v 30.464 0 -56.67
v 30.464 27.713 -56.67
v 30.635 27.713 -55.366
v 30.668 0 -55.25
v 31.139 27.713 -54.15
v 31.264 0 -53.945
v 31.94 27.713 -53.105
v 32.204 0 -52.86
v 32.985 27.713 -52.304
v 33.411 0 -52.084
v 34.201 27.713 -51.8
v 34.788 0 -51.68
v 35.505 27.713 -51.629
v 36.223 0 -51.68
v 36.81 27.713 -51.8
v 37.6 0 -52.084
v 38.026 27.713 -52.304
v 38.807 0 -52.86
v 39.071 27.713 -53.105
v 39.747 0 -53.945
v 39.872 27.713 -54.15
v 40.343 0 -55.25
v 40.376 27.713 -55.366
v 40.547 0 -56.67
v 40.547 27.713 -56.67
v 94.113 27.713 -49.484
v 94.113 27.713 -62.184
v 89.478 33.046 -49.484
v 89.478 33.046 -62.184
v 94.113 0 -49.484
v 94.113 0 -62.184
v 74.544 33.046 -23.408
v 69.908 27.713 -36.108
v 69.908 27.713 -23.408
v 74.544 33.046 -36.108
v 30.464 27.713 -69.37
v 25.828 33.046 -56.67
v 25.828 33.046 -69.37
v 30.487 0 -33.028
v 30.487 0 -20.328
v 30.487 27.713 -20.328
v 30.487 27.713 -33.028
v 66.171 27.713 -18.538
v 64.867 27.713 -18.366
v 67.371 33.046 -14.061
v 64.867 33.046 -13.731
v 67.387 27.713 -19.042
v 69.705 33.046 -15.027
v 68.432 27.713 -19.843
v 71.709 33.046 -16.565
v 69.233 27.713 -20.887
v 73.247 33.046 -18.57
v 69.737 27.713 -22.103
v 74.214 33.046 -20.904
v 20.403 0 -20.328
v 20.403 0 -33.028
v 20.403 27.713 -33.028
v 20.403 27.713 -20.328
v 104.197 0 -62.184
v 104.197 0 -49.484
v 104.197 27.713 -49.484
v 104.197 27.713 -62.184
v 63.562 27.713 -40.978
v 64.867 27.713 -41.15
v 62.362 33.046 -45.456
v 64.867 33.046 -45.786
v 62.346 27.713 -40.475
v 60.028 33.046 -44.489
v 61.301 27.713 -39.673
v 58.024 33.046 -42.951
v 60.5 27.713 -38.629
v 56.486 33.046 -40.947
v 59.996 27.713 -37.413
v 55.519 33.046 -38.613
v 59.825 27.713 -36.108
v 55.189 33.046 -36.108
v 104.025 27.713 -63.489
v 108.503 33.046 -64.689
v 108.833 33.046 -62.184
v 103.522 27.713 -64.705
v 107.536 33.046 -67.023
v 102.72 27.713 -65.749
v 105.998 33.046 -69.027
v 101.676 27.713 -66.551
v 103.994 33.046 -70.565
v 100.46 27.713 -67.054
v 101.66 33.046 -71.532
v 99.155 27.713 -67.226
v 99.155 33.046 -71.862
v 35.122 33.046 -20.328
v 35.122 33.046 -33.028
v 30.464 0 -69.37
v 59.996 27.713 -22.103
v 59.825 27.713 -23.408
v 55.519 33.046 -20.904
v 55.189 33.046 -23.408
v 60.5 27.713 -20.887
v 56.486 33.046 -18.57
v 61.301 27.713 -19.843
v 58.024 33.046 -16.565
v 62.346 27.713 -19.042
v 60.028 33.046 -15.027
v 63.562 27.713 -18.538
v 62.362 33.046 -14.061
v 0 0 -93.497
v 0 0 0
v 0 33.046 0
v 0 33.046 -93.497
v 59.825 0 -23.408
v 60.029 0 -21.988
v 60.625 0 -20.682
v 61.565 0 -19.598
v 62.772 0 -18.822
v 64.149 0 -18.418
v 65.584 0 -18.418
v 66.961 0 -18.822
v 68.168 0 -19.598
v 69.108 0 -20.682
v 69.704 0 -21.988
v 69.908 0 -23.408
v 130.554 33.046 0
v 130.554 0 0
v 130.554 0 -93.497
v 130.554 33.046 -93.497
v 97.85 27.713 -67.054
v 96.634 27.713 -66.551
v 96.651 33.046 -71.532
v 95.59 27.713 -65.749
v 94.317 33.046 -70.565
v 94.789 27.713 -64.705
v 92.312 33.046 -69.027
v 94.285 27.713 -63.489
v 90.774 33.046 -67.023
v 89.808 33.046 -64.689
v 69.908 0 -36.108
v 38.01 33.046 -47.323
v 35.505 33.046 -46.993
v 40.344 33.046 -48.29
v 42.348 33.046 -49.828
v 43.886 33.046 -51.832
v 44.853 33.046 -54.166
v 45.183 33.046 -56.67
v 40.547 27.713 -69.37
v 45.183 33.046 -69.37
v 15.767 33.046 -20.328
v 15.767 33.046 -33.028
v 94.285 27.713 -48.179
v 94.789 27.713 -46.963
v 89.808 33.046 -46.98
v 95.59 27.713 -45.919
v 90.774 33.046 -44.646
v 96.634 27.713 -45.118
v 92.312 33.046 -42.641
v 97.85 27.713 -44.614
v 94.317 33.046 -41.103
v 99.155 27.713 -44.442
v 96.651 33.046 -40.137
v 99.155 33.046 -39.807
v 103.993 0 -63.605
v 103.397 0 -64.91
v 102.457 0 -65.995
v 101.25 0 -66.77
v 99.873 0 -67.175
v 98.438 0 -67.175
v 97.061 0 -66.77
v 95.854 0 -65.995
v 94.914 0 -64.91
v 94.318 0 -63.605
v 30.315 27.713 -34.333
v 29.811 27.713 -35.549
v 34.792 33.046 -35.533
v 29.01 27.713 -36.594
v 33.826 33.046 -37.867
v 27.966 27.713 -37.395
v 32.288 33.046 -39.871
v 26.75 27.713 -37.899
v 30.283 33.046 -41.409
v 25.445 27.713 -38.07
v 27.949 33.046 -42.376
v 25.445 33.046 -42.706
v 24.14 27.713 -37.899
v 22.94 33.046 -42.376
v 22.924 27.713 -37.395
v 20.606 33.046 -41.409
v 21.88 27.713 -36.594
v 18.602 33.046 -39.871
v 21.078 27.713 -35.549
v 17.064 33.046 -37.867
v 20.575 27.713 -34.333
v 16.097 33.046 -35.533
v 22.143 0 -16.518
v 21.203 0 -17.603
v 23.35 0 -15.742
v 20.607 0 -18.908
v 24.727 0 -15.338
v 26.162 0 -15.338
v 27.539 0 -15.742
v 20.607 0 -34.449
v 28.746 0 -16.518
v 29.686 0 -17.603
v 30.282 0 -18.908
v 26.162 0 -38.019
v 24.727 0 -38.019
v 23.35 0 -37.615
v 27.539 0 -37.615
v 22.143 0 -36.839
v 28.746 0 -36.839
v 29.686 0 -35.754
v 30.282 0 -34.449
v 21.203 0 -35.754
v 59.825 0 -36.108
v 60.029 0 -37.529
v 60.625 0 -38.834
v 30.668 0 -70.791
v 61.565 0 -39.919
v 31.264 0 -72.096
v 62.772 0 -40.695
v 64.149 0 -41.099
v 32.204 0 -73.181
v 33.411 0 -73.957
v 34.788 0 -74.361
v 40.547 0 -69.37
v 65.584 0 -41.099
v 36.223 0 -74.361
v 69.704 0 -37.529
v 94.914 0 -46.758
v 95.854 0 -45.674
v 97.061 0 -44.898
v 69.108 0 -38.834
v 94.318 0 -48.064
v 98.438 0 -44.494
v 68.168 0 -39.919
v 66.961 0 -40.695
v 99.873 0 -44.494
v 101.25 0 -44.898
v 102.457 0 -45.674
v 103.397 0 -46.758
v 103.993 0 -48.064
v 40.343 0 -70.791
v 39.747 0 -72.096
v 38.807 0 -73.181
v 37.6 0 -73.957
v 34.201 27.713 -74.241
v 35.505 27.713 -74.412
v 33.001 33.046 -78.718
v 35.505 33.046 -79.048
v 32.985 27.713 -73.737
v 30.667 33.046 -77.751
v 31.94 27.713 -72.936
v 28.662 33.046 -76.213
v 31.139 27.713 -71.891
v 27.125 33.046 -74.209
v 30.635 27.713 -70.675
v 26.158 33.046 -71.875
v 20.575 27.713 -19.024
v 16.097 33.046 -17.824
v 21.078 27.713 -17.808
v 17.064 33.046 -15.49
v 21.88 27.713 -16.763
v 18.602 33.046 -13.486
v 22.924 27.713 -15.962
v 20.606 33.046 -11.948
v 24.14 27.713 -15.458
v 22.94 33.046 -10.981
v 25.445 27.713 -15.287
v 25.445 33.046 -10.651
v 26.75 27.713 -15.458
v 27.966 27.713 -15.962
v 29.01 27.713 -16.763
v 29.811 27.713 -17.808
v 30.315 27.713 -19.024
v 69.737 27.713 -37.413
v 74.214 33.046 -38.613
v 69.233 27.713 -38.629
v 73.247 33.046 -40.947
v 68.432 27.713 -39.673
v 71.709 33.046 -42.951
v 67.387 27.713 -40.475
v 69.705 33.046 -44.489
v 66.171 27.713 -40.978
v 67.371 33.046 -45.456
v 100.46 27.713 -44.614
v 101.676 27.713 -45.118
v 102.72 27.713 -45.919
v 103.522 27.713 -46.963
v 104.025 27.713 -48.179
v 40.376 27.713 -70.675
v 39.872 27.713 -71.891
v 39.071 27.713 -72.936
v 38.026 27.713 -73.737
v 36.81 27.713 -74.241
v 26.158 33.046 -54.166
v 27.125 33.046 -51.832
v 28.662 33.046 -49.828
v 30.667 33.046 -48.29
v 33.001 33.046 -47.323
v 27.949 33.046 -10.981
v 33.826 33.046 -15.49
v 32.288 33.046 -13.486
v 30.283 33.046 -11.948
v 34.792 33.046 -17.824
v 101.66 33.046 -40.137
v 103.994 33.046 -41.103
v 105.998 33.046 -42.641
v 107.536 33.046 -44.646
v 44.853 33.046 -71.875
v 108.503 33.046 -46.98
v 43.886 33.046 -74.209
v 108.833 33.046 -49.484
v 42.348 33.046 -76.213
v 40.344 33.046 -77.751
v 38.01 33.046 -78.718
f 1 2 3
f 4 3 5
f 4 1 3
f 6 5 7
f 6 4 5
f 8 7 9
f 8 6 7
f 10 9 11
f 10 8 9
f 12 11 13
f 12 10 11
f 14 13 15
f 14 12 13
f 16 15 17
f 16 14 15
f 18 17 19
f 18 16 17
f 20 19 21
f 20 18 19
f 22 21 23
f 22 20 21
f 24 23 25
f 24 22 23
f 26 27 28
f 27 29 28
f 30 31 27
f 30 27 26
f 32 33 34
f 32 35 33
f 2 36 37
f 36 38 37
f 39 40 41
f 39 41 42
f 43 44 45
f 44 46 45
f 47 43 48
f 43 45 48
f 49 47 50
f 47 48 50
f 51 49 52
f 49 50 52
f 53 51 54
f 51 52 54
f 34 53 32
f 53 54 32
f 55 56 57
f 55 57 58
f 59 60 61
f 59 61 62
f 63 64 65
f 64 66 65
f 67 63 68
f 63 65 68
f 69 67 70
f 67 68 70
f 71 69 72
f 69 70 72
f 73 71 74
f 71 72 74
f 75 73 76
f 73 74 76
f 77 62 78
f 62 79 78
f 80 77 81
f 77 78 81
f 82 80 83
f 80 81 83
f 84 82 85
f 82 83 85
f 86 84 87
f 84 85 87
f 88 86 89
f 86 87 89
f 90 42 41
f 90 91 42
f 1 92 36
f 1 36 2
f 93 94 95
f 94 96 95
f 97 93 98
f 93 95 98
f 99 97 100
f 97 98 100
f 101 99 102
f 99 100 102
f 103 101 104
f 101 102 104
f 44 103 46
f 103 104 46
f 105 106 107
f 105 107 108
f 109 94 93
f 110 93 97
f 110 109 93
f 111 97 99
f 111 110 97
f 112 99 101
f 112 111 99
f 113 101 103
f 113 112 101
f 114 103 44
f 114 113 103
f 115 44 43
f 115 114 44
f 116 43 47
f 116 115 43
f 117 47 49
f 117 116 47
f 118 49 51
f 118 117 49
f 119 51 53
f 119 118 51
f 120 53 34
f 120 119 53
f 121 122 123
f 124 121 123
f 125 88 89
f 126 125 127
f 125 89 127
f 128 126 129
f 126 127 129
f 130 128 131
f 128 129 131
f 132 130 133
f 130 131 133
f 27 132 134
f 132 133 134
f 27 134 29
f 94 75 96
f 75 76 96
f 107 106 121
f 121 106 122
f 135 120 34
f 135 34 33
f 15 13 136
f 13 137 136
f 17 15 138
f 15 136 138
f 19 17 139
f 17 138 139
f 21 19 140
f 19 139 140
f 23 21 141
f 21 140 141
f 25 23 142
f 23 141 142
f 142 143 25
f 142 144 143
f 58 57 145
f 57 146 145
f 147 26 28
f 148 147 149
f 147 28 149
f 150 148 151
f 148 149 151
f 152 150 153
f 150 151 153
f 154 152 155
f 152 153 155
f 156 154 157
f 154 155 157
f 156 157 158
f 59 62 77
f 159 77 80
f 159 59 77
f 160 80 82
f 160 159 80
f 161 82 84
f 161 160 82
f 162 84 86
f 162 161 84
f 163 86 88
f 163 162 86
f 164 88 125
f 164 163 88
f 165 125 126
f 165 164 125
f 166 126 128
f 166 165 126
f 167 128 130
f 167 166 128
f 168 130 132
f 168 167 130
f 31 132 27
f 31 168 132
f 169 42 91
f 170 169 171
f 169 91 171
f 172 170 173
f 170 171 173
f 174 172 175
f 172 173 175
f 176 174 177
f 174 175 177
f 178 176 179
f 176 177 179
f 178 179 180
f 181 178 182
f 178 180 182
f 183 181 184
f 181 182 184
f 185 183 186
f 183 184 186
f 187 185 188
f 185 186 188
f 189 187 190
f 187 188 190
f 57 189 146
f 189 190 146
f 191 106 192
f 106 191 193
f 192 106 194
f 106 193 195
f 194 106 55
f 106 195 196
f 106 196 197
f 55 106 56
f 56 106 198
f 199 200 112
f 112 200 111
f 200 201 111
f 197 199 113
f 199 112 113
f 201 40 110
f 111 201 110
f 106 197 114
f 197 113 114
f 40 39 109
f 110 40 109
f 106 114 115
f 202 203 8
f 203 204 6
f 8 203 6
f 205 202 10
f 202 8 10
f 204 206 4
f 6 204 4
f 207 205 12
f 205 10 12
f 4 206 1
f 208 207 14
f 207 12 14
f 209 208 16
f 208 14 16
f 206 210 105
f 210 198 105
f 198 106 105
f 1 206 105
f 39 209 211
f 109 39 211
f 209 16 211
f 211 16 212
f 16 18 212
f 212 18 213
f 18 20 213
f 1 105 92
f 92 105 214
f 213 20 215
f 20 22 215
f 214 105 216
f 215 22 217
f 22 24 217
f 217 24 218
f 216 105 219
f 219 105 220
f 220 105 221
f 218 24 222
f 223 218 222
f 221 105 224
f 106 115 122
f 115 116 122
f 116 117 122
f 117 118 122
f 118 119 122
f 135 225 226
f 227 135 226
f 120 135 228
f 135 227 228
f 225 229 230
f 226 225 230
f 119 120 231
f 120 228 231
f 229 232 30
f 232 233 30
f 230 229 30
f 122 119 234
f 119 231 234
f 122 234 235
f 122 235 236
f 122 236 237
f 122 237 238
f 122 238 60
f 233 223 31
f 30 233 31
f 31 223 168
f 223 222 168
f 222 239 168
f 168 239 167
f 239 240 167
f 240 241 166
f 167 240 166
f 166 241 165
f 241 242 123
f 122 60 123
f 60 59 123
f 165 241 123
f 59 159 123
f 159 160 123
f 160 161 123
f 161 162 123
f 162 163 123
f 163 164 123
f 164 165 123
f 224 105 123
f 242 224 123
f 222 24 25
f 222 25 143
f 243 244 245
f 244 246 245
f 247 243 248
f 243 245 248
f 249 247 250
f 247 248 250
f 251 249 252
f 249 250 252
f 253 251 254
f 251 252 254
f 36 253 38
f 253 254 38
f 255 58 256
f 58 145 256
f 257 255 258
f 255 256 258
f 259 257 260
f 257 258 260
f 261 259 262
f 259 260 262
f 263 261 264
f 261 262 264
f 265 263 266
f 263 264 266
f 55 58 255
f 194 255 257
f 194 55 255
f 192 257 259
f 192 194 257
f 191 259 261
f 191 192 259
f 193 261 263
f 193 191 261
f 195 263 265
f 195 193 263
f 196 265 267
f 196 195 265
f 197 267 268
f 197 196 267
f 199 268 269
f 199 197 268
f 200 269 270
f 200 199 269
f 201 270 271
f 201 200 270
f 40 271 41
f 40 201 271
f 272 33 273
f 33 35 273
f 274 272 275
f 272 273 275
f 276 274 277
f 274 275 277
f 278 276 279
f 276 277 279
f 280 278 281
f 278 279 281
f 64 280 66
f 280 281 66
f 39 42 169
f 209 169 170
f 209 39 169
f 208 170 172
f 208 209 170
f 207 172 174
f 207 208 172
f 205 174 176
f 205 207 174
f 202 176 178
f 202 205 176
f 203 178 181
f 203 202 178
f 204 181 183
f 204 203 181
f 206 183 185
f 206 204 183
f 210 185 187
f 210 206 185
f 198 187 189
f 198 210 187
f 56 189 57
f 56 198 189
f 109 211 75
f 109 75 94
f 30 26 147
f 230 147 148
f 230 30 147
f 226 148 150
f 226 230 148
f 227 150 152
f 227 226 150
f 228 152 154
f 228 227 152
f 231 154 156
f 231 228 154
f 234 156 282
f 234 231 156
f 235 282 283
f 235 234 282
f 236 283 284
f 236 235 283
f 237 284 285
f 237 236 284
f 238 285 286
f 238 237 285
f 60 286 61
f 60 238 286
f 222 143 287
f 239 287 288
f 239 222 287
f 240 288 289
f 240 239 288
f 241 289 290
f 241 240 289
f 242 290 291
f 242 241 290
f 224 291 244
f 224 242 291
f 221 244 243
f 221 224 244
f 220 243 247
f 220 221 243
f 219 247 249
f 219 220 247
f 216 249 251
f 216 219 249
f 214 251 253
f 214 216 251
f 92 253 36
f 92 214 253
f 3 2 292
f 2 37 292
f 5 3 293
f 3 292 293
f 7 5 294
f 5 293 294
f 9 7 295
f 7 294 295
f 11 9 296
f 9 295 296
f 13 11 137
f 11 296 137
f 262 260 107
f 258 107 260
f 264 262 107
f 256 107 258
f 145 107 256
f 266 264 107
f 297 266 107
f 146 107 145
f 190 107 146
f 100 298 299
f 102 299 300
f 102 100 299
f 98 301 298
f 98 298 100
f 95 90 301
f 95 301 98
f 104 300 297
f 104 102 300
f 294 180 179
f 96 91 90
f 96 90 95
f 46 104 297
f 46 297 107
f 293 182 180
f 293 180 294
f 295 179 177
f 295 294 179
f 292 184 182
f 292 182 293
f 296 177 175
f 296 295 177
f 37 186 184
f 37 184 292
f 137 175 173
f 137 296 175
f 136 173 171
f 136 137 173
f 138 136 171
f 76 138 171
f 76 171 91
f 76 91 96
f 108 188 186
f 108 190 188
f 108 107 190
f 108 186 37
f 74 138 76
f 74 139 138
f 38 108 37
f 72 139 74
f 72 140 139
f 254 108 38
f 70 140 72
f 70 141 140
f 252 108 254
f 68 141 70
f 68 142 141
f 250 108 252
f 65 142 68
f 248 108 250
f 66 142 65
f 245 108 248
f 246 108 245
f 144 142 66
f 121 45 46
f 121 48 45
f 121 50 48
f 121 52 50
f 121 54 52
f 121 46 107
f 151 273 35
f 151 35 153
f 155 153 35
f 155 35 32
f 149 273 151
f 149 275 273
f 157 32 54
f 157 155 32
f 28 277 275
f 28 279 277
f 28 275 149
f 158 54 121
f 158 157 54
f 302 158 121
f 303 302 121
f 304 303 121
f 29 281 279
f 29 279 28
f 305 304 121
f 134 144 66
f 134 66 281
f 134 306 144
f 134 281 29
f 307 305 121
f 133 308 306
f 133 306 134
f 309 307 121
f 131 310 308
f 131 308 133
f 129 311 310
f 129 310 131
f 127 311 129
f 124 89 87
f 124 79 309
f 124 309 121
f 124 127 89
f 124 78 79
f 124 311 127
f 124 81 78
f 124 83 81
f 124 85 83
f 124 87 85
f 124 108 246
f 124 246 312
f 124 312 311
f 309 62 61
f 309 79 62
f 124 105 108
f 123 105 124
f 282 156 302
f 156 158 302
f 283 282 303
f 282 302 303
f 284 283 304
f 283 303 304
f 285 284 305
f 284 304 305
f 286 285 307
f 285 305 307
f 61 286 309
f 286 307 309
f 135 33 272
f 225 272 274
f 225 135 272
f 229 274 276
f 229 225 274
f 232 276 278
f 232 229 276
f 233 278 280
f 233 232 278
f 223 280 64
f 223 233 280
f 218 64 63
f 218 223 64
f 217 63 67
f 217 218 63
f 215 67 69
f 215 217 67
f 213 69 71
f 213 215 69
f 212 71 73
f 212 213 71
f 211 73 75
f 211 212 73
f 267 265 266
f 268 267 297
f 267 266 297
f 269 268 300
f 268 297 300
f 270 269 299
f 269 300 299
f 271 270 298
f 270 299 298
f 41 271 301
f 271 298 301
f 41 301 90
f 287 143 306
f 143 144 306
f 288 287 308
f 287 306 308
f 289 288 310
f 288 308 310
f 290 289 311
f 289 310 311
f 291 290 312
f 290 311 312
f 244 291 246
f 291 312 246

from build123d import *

# Parameters (mm, degrees)
SKETCH1_W                                      = 130.554298298
SKETCH1_H                                      = 93.497401401
BOSS_EXTRUDE1_DEPTH                            = 33.046022073
CSK_SLOT_FOR_3_8_FLAT_HEAD_MACHINE_SCREW_DEPTH = 33.046022073


with BuildPart() as part:
    # Sketch1 → Boss-Extrude1 (new body)
    with BuildSketch(Plane(origin=(0, 0, 0), x_dir=(1, 0, 0), z_dir=(0, 1, 0))):
        with Locations((65.277149149, 46.748700701)):
            Rectangle(SKETCH1_W, SKETCH1_H)
    extrude(amount=BOSS_EXTRUDE1_DEPTH)

    # CSK SLOT for 3/8 Flat Head Machine Screw1: read off the stored shape, not the designer's step
    # CSK SLOT for 3_8 Flat Head Machine S 2 → CSK SLOT for 3/8 Flat Head Machine Screw1 (cut)
    with BuildSketch(Plane(origin=(0, 0, 0), x_dir=(1, 0, 0), z_dir=(0, 1, 0))):
        with BuildLine():
            Line((30.486575013, 20.328472109), (30.486575013, 33.028472109))
            ThreePointArc((30.486575013, 33.028472109), (25.444675013, 38.070372109), (20.402775013, 33.028472109))
            Line((20.402775013, 33.028472109), (20.402775013, 20.328472109))
            ThreePointArc((20.402775013, 20.328472109), (25.444675013, 15.286572109), (30.486575013, 20.328472109))
        make_face()
        with BuildLine():
            Line((69.908405086, 23.408302584), (69.908405086, 36.108302584))
            ThreePointArc((69.908405086, 36.108302584), (64.866505086, 41.150202584), (59.824605086, 36.108302584))
            Line((59.824605086, 36.108302584), (59.824605086, 23.408302584))
            ThreePointArc((59.824605086, 23.408302584), (64.866505086, 18.366402584), (69.908405086, 23.408302584))
        make_face()
        with BuildLine():
            Line((104.197184368, 49.4842006), (104.197184368, 62.1842006))
            ThreePointArc((104.197184368, 62.1842006), (99.155284368, 67.2261006), (94.113384368, 62.1842006))
            Line((94.113384368, 62.1842006), (94.113384368, 49.4842006))
            ThreePointArc((94.113384368, 49.4842006), (99.155284368, 44.4423006), (104.197184368, 49.4842006))
        make_face()
        with BuildLine():
            Line((40.547354563, 56.670471707), (40.547354563, 69.370471707))
            ThreePointArc((40.547354563, 69.370471707), (35.505454563, 74.412371707), (30.463554563, 69.370471707))
            Line((30.463554563, 69.370471707), (30.463554563, 56.670471707))
            ThreePointArc((30.463554563, 56.670471707), (35.505454563, 51.628571707), (40.547354563, 56.670471707))
        make_face()
    extrude(amount=CSK_SLOT_FOR_3_8_FLAT_HEAD_MACHINE_SCREW_DEPTH, mode=Mode.SUBTRACT)

    # CSK SLOT for 3_8 Flat Head Machine S 3: loft between two sections, ruled curve by curve
    csk_slot_for_3_8_flat_head_machine_s_3_from = [
        Edge.make_three_point_arc((30.486575013, 27.713489321, -33.028472109), (29.009836693, 27.713489321, -36.593633789), (25.444675013, 27.713489321, -38.070372109)),
        Edge.make_three_point_arc((25.444675013, 27.713489321, -38.070372109), (21.879513333, 27.713489321, -36.593633789), (20.402775013, 27.713489321, -33.028472109)),
        Edge.make_three_point_arc((20.402775013, 27.713489321, -20.328472109), (21.879513333, 27.713489321, -16.763310429), (25.444675013, 27.713489321, -15.286572109)),
        Edge.make_three_point_arc((25.444675013, 27.713489321, -15.286572109), (29.009836693, 27.713489321, -16.763310429), (30.486575013, 27.713489321, -20.328472109)),
        Edge.make_line((20.402775013, 27.713489321, -33.028472109), (20.402775013, 27.713489321, -20.328472109)),
        Edge.make_line((30.486575013, 27.713489321, -33.028472109), (30.486575013, 27.713489321, -20.328472109)),
    ]
    csk_slot_for_3_8_flat_head_machine_s_3_to = [
        Edge.make_three_point_arc((35.122075013, 33.046022073, -33.028472109), (32.287630178, 33.046022073, -39.871427273), (25.444675013, 33.046022073, -42.705872109)),
        Edge.make_three_point_arc((25.444675013, 33.046022073, -42.705872109), (18.601719849, 33.046022073, -39.871427273), (15.767275013, 33.046022073, -33.028472109)),
        Edge.make_three_point_arc((15.767275013, 33.046022073, -20.328472109), (18.601719849, 33.046022073, -13.485516945), (25.444675013, 33.046022073, -10.651072109)),
        Edge.make_three_point_arc((25.444675013, 33.046022073, -10.651072109), (32.287630178, 33.046022073, -13.485516945), (35.122075013, 33.046022073, -20.328472109)),
        Edge.make_line((15.767275013, 33.046022073, -33.028472109), (15.767275013, 33.046022073, -20.328472109)),
        Edge.make_line((35.122075013, 33.046022073, -33.028472109), (35.122075013, 33.046022073, -20.328472109)),
    ]
    csk_slot_for_3_8_flat_head_machine_s_3 = Solid(Shell([*[Face.make_surface_from_curves(csk_slot_for_3_8_flat_head_machine_s_3_from[k], csk_slot_for_3_8_flat_head_machine_s_3_to[k]) for k in range(6)], Face(Wire(csk_slot_for_3_8_flat_head_machine_s_3_from)), Face(Wire(csk_slot_for_3_8_flat_head_machine_s_3_to))]))
    add(csk_slot_for_3_8_flat_head_machine_s_3, mode=Mode.SUBTRACT)

    # CSK SLOT for 3_8 Flat Head Machine S 4: loft between two sections, ruled curve by curve
    csk_slot_for_3_8_flat_head_machine_s_4_from = [
        Edge.make_three_point_arc((69.908405086, 27.713489321, -36.108302584), (68.431666766, 27.713489321, -39.673464264), (64.866505086, 27.713489321, -41.150202584)),
        Edge.make_three_point_arc((64.866505086, 27.713489321, -41.150202584), (61.301343406, 27.713489321, -39.673464264), (59.824605086, 27.713489321, -36.108302584)),
        Edge.make_three_point_arc((59.824605086, 27.713489321, -23.408302584), (61.301343406, 27.713489321, -19.843140903), (64.866505086, 27.713489321, -18.366402584)),
        Edge.make_three_point_arc((64.866505086, 27.713489321, -18.366402584), (68.431666766, 27.713489321, -19.843140903), (69.908405086, 27.713489321, -23.408302584)),
        Edge.make_line((59.824605086, 27.713489321, -36.108302584), (59.824605086, 27.713489321, -23.408302584)),
        Edge.make_line((69.908405086, 27.713489321, -36.108302584), (69.908405086, 27.713489321, -23.408302584)),
    ]
    csk_slot_for_3_8_flat_head_machine_s_4_to = [
        Edge.make_three_point_arc((74.543905086, 33.046022073, -36.108302584), (71.70946025, 33.046022073, -42.951257748), (64.866505086, 33.046022073, -45.785702584)),
        Edge.make_three_point_arc((64.866505086, 33.046022073, -45.785702584), (58.023549922, 33.046022073, -42.951257748), (55.189105086, 33.046022073, -36.108302584)),
        Edge.make_three_point_arc((55.189105086, 33.046022073, -23.408302584), (58.023549922, 33.046022073, -16.565347419), (64.866505086, 33.046022073, -13.730902584)),
        Edge.make_three_point_arc((64.866505086, 33.046022073, -13.730902584), (71.70946025, 33.046022073, -16.565347419), (74.543905086, 33.046022073, -23.408302584)),
        Edge.make_line((55.189105086, 33.046022073, -36.108302584), (55.189105086, 33.046022073, -23.408302584)),
        Edge.make_line((74.543905086, 33.046022073, -36.108302584), (74.543905086, 33.046022073, -23.408302584)),
    ]
    csk_slot_for_3_8_flat_head_machine_s_4 = Solid(Shell([*[Face.make_surface_from_curves(csk_slot_for_3_8_flat_head_machine_s_4_from[k], csk_slot_for_3_8_flat_head_machine_s_4_to[k]) for k in range(6)], Face(Wire(csk_slot_for_3_8_flat_head_machine_s_4_from)), Face(Wire(csk_slot_for_3_8_flat_head_machine_s_4_to))]))
    add(csk_slot_for_3_8_flat_head_machine_s_4, mode=Mode.SUBTRACT)

    # CSK SLOT for 3_8 Flat Head Machine S 5: loft between two sections, ruled curve by curve
    csk_slot_for_3_8_flat_head_machine_s_5_from = [
        Edge.make_three_point_arc((104.197184368, 27.713489321, -62.1842006), (102.720446048, 27.713489321, -65.74936228), (99.155284368, 27.713489321, -67.2261006)),
        Edge.make_three_point_arc((99.155284368, 27.713489321, -67.2261006), (95.590122688, 27.713489321, -65.74936228), (94.113384368, 27.713489321, -62.1842006)),
        Edge.make_three_point_arc((94.113384368, 27.713489321, -49.4842006), (95.590122688, 27.713489321, -45.91903892), (99.155284368, 27.713489321, -44.4423006)),
        Edge.make_three_point_arc((99.155284368, 27.713489321, -44.4423006), (102.720446048, 27.713489321, -45.91903892), (104.197184368, 27.713489321, -49.4842006)),
        Edge.make_line((94.113384368, 27.713489321, -62.1842006), (94.113384368, 27.713489321, -49.4842006)),
        Edge.make_line((104.197184368, 27.713489321, -62.1842006), (104.197184368, 27.713489321, -49.4842006)),
    ]
    csk_slot_for_3_8_flat_head_machine_s_5_to = [
        Edge.make_three_point_arc((108.832684368, 33.046022073, -62.1842006), (105.998239532, 33.046022073, -69.027155764), (99.155284368, 33.046022073, -71.8616006)),
        Edge.make_three_point_arc((99.155284368, 33.046022073, -71.8616006), (92.312329203, 33.046022073, -69.027155764), (89.477884368, 33.046022073, -62.1842006)),
        Edge.make_three_point_arc((89.477884368, 33.046022073, -49.4842006), (92.312329203, 33.046022073, -42.641245436), (99.155284368, 33.046022073, -39.8068006)),
        Edge.make_three_point_arc((99.155284368, 33.046022073, -39.8068006), (105.998239532, 33.046022073, -42.641245436), (108.832684368, 33.046022073, -49.4842006)),
        Edge.make_line((89.477884368, 33.046022073, -62.1842006), (89.477884368, 33.046022073, -49.4842006)),
        Edge.make_line((108.832684368, 33.046022073, -62.1842006), (108.832684368, 33.046022073, -49.4842006)),
    ]
    csk_slot_for_3_8_flat_head_machine_s_5 = Solid(Shell([*[Face.make_surface_from_curves(csk_slot_for_3_8_flat_head_machine_s_5_from[k], csk_slot_for_3_8_flat_head_machine_s_5_to[k]) for k in range(6)], Face(Wire(csk_slot_for_3_8_flat_head_machine_s_5_from)), Face(Wire(csk_slot_for_3_8_flat_head_machine_s_5_to))]))
    add(csk_slot_for_3_8_flat_head_machine_s_5, mode=Mode.SUBTRACT)

    # CSK SLOT for 3_8 Flat Head Machine S 6: loft between two sections, ruled curve by curve
    csk_slot_for_3_8_flat_head_machine_s_6_from = [
        Edge.make_three_point_arc((40.547354563, 27.713489321, -69.370471707), (39.070616243, 27.713489321, -72.935633387), (35.505454563, 27.713489321, -74.412371707)),
        Edge.make_three_point_arc((35.505454563, 27.713489321, -74.412371707), (31.940292883, 27.713489321, -72.935633387), (30.463554563, 27.713489321, -69.370471707)),
        Edge.make_three_point_arc((30.463554563, 27.713489321, -56.670471707), (31.940292883, 27.713489321, -53.105310027), (35.505454563, 27.713489321, -51.628571707)),
        Edge.make_three_point_arc((35.505454563, 27.713489321, -51.628571707), (39.070616243, 27.713489321, -53.105310027), (40.547354563, 27.713489321, -56.670471707)),
        Edge.make_line((30.463554563, 27.713489321, -69.370471707), (30.463554563, 27.713489321, -56.670471707)),
        Edge.make_line((40.547354563, 27.713489321, -69.370471707), (40.547354563, 27.713489321, -56.670471707)),
    ]
    csk_slot_for_3_8_flat_head_machine_s_6_to = [
        Edge.make_three_point_arc((45.182854563, 33.046022073, -69.370471707), (42.348409727, 33.046022073, -76.213426871), (35.505454563, 33.046022073, -79.047871707)),
        Edge.make_three_point_arc((35.505454563, 33.046022073, -79.047871707), (28.662499399, 33.046022073, -76.213426871), (25.828054563, 33.046022073, -69.370471707)),
        Edge.make_three_point_arc((25.828054563, 33.046022073, -56.670471707), (28.662499399, 33.046022073, -49.827516543), (35.505454563, 33.046022073, -46.993071707)),
        Edge.make_three_point_arc((35.505454563, 33.046022073, -46.993071707), (42.348409727, 33.046022073, -49.827516543), (45.182854563, 33.046022073, -56.670471707)),
        Edge.make_line((25.828054563, 33.046022073, -69.370471707), (25.828054563, 33.046022073, -56.670471707)),
        Edge.make_line((45.182854563, 33.046022073, -69.370471707), (45.182854563, 33.046022073, -56.670471707)),
    ]
    csk_slot_for_3_8_flat_head_machine_s_6 = Solid(Shell([*[Face.make_surface_from_curves(csk_slot_for_3_8_flat_head_machine_s_6_from[k], csk_slot_for_3_8_flat_head_machine_s_6_to[k]) for k in range(6)], Face(Wire(csk_slot_for_3_8_flat_head_machine_s_6_from)), Face(Wire(csk_slot_for_3_8_flat_head_machine_s_6_to))]))
    add(csk_slot_for_3_8_flat_head_machine_s_6, mode=Mode.SUBTRACT)


solid = part.part
